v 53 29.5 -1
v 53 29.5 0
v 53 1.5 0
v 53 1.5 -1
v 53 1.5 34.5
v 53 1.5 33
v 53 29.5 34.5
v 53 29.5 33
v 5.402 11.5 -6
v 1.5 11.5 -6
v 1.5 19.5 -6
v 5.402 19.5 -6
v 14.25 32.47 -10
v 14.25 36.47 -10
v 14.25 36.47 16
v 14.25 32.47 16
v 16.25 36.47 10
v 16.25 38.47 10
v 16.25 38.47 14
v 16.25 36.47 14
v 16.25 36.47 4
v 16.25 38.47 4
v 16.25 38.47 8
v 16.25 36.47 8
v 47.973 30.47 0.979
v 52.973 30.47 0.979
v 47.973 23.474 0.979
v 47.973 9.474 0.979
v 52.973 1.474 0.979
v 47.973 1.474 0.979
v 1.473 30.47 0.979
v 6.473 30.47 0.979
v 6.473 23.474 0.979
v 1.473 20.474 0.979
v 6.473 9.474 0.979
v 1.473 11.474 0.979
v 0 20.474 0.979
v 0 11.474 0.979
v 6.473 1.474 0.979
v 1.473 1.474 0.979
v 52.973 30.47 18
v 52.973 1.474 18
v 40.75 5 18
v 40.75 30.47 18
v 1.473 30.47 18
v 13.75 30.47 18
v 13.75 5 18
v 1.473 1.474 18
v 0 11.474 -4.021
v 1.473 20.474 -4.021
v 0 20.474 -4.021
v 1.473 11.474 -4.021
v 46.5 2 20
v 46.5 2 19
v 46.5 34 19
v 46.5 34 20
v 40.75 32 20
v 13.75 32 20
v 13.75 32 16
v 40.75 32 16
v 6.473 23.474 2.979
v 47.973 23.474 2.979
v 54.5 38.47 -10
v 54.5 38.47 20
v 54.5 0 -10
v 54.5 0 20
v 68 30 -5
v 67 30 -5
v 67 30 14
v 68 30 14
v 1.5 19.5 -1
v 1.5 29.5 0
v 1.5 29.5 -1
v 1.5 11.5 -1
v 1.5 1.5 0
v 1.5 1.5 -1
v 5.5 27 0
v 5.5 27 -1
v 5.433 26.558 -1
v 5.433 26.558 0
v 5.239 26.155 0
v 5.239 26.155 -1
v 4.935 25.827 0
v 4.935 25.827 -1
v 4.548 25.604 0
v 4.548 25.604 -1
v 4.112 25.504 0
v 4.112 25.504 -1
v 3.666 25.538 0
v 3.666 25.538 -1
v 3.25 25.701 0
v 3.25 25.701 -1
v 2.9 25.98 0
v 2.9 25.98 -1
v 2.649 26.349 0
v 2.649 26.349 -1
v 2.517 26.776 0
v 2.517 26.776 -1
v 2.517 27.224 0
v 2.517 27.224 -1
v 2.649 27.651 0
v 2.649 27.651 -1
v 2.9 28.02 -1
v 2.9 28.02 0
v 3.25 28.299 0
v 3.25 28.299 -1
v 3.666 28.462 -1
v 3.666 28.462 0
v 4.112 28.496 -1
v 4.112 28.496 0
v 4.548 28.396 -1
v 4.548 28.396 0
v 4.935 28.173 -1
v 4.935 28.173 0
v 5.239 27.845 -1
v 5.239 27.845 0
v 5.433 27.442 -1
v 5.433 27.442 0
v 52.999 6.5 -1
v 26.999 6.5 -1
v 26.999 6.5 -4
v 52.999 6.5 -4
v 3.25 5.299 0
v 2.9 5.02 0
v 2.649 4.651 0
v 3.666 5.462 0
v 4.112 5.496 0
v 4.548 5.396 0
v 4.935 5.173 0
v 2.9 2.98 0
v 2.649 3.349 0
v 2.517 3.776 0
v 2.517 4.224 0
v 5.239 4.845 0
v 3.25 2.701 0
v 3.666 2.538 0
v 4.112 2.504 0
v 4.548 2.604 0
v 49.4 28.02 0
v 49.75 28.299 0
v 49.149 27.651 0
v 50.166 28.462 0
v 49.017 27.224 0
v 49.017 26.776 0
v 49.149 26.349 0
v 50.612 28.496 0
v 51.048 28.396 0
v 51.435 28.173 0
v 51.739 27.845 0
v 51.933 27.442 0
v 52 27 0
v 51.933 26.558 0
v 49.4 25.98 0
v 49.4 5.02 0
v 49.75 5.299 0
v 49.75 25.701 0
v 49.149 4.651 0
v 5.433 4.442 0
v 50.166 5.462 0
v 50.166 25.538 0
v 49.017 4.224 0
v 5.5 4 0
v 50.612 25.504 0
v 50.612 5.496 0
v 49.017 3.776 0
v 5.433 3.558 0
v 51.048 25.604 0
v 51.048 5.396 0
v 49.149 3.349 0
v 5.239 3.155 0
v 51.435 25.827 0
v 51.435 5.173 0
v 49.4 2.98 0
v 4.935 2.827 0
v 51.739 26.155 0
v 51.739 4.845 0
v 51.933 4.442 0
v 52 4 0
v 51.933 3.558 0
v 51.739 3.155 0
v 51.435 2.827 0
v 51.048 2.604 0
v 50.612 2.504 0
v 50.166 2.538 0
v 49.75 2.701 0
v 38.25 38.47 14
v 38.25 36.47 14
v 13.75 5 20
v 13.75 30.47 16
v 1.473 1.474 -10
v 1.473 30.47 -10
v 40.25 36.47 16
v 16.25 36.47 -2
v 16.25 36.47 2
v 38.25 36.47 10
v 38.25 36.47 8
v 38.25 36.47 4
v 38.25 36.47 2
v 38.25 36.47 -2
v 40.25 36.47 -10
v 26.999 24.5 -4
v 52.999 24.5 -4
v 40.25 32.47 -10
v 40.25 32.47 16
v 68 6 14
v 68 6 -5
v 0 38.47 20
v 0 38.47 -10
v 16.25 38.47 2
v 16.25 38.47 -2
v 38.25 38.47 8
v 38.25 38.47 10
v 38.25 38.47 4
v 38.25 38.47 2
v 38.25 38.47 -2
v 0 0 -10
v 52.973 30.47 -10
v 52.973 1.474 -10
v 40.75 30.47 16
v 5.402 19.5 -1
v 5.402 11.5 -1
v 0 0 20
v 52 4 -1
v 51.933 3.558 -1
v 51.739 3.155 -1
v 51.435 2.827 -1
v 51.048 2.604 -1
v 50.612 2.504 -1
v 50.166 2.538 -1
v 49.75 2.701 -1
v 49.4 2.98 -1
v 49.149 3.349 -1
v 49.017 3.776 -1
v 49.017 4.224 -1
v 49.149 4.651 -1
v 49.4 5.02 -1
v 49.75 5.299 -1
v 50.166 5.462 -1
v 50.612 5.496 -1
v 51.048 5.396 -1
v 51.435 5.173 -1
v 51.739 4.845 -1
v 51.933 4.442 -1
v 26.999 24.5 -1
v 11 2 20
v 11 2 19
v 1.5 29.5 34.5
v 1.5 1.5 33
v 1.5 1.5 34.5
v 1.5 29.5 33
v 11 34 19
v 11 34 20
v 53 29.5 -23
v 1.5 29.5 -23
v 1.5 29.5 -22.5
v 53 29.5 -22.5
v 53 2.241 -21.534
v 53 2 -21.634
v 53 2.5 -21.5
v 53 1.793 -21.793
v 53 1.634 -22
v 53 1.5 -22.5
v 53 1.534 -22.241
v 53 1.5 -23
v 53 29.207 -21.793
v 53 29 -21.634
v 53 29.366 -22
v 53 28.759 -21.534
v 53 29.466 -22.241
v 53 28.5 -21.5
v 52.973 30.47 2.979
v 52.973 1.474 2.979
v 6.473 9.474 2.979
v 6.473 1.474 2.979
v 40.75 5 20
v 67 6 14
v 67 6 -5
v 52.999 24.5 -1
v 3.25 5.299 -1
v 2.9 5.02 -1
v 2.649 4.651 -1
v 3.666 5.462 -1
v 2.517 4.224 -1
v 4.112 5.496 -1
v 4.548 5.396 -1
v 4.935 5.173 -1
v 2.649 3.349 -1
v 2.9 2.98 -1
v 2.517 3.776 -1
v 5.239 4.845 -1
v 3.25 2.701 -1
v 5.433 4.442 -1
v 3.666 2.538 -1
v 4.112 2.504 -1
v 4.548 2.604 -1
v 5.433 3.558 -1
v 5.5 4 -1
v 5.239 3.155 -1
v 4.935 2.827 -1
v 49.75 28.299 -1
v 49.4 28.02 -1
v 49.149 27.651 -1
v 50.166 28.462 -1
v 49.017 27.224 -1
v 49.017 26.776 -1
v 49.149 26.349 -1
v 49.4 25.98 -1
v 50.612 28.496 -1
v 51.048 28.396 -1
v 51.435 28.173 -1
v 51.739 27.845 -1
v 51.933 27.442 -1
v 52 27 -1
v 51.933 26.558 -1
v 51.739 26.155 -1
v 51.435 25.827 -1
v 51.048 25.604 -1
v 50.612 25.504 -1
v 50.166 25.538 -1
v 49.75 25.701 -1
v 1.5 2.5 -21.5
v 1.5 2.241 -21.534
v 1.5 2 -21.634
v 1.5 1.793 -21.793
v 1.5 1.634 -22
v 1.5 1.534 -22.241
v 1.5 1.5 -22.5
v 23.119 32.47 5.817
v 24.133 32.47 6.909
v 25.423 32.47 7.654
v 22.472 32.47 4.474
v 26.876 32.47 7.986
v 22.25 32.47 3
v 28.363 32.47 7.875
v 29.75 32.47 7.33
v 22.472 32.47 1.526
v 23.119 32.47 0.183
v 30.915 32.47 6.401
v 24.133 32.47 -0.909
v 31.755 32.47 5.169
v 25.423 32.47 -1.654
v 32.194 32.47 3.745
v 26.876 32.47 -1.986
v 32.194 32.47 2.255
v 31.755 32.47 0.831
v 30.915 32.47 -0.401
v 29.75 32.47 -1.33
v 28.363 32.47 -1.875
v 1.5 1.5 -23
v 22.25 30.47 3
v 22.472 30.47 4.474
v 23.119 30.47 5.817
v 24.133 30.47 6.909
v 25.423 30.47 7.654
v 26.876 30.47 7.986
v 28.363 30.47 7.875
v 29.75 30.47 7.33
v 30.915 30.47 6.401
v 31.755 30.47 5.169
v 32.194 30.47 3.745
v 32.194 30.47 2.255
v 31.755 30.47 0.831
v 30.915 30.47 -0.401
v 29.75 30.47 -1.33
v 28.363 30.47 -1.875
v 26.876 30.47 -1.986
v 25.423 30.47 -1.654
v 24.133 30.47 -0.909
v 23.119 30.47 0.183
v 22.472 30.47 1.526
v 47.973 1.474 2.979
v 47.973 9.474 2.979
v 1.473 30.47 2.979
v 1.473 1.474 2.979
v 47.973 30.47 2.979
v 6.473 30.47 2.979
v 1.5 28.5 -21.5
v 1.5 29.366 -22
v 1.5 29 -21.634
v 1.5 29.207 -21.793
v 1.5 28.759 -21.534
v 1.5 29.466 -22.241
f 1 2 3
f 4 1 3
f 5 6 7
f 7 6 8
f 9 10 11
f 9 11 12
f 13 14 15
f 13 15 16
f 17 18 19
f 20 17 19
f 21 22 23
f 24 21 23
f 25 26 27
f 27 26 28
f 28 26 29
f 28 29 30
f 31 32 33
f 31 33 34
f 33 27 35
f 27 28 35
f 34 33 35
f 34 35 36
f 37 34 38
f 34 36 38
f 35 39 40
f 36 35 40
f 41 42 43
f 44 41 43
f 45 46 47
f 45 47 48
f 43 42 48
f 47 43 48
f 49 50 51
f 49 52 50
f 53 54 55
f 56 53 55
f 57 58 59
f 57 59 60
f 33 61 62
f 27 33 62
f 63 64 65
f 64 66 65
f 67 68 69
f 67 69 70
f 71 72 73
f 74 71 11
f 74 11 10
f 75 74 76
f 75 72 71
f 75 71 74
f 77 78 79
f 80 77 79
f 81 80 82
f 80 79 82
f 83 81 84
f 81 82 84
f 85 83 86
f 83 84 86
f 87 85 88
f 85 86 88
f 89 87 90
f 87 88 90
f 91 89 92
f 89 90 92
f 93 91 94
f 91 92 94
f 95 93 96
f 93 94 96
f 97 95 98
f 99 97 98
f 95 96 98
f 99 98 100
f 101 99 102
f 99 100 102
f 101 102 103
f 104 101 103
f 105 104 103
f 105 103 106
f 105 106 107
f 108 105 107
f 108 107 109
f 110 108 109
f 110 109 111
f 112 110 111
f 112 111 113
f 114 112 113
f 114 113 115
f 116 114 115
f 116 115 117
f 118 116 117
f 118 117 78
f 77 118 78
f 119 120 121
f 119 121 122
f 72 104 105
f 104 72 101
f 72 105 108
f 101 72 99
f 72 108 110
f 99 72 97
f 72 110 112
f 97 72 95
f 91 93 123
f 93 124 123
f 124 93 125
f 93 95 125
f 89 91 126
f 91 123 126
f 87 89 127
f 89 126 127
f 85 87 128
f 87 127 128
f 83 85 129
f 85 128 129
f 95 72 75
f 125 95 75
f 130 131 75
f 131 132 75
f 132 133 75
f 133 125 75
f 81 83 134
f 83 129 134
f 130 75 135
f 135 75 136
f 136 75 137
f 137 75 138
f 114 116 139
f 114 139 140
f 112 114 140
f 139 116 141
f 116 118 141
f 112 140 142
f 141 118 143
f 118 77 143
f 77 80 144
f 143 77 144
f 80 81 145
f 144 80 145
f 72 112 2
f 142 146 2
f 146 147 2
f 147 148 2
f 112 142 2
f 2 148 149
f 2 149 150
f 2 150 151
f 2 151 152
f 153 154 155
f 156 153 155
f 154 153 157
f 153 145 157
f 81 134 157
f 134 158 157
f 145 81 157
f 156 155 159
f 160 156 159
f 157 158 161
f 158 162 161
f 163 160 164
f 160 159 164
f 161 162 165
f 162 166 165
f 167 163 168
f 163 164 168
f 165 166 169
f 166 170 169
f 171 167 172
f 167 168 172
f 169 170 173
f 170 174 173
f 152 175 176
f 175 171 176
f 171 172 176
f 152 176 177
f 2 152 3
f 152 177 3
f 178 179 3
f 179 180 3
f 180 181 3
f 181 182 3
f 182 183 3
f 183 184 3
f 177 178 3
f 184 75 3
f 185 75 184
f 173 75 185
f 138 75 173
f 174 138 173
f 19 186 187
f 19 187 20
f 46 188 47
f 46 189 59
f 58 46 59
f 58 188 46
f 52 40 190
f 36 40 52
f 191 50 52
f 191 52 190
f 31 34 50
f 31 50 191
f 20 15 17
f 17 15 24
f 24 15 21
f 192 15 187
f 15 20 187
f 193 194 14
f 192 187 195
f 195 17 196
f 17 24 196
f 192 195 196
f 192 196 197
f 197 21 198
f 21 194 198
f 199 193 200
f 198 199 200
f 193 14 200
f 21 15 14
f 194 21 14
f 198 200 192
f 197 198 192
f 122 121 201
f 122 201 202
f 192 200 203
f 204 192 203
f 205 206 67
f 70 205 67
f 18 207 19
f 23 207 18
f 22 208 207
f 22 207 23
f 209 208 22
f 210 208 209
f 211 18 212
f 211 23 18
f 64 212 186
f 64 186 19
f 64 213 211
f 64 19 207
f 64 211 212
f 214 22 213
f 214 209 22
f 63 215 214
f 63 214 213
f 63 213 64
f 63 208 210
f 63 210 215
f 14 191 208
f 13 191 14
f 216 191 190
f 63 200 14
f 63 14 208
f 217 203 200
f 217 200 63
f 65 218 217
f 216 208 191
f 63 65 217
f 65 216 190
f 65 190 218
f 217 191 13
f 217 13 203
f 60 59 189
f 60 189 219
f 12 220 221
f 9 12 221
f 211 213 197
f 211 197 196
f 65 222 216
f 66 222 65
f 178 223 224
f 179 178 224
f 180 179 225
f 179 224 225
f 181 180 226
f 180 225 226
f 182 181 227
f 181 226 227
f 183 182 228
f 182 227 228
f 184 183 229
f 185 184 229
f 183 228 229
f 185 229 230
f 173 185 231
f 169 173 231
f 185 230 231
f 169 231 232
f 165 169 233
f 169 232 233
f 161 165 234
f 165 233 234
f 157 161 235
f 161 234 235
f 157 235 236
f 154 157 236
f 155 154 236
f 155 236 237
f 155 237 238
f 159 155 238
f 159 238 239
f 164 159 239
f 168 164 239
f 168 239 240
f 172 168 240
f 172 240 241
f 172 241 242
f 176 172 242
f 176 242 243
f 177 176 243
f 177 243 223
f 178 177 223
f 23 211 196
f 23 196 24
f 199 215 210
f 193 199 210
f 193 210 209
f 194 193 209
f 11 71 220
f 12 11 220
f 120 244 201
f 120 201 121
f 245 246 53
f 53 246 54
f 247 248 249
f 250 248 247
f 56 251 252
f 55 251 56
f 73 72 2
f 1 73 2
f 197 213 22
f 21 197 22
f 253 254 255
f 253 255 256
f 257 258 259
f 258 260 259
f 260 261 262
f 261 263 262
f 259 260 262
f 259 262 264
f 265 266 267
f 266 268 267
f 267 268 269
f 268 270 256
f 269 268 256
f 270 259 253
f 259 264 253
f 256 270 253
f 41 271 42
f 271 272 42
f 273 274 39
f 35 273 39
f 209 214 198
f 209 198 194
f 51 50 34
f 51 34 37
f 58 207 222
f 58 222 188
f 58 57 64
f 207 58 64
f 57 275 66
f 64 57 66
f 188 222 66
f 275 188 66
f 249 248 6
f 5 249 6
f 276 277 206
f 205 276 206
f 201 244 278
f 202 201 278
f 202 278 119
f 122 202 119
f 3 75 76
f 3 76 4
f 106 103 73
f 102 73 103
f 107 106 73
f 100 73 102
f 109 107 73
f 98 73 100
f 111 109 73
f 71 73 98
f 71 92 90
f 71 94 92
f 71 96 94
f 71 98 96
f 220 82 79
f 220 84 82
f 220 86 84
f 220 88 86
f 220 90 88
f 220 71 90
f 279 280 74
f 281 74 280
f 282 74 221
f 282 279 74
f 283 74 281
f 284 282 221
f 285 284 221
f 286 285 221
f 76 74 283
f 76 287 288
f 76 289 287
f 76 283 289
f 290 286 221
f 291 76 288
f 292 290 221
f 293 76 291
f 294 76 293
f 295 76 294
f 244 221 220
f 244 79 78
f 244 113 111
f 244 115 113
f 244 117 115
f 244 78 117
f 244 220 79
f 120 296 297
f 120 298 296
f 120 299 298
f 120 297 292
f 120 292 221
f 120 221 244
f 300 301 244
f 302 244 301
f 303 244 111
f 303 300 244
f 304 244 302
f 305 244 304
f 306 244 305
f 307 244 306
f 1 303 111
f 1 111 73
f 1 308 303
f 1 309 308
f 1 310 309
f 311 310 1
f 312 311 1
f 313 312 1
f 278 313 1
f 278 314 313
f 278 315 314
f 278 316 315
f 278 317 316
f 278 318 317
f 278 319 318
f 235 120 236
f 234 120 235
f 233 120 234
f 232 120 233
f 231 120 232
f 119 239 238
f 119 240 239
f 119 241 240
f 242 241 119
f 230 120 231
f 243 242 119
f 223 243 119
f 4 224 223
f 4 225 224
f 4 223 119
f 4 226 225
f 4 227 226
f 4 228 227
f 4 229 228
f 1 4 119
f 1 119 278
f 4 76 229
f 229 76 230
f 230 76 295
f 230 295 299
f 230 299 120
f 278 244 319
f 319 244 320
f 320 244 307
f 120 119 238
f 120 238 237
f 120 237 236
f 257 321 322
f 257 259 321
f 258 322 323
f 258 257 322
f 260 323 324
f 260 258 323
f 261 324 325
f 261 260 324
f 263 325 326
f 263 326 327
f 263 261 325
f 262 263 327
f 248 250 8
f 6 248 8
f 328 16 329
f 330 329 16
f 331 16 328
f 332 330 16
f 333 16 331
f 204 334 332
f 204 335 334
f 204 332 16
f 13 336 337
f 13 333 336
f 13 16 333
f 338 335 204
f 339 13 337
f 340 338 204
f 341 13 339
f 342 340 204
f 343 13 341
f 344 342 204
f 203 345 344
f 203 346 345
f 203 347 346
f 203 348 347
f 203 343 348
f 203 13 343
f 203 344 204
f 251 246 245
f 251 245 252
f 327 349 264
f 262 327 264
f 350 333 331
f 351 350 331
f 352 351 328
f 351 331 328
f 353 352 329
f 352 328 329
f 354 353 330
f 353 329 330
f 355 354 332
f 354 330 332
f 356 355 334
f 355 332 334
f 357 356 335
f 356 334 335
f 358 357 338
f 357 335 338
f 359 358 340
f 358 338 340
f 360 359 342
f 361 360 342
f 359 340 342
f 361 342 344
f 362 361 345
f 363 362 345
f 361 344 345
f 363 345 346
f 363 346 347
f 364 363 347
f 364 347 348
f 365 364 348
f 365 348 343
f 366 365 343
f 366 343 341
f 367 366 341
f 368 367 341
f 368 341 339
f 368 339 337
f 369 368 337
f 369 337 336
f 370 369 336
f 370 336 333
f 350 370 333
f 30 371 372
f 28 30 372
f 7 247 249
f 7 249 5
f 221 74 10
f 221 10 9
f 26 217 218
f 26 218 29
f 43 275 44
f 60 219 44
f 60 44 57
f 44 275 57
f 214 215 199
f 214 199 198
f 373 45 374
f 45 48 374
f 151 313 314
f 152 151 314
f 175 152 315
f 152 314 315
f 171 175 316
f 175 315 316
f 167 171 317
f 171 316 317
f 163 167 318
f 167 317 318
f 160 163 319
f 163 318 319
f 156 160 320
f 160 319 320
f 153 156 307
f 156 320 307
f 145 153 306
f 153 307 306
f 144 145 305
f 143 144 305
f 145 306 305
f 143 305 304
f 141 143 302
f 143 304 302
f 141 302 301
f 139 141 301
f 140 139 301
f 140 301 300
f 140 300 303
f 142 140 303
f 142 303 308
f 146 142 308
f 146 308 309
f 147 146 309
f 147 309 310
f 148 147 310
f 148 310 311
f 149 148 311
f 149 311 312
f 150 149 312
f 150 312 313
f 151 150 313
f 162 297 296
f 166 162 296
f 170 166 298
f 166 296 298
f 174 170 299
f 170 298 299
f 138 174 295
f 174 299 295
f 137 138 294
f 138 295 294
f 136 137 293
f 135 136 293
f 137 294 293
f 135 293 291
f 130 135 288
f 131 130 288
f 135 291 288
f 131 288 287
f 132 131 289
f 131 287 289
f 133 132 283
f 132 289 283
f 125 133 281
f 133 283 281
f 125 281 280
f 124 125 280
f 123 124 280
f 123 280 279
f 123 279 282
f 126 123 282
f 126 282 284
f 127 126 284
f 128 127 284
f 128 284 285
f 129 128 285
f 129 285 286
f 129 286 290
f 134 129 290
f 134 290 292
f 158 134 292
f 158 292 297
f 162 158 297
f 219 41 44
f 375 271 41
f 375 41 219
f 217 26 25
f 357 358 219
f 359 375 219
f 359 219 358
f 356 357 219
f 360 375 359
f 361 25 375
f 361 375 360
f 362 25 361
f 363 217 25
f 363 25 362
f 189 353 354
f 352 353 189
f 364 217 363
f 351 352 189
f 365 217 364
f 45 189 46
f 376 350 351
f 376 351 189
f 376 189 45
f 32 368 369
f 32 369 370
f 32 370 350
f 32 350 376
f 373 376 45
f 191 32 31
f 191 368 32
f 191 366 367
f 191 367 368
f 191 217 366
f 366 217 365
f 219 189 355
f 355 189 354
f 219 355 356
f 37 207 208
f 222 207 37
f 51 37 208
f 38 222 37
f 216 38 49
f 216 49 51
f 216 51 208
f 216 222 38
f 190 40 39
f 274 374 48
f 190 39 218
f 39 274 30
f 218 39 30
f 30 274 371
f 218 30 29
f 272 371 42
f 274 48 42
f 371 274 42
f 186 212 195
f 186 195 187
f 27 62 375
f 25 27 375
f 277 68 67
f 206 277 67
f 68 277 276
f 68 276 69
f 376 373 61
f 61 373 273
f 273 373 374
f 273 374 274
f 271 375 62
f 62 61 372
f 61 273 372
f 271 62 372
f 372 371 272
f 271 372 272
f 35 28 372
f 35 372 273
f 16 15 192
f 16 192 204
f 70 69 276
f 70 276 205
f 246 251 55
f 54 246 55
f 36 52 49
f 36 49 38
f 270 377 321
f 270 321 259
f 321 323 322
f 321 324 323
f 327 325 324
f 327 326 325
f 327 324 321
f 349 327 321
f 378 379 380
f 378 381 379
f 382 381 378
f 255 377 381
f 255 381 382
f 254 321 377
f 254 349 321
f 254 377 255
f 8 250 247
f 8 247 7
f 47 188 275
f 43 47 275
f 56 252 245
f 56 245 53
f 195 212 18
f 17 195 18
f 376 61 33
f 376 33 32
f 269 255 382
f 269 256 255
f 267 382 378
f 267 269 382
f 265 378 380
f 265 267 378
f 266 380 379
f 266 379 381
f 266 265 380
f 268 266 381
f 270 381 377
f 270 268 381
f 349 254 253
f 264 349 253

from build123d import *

# Parameters (mm, degrees)
SKETCH_W             = 51.5
SKETCH_H             = 28
PAD_DEPTH            = 1
SKETCH001_R          = 1.5
POCKET_DEPTH         = 5
SKETCH002_W          = 26
SKETCH002_H          = 18
PAD001_DEPTH         = 3
SKETCH006_W          = 3.902349
SKETCH006_H          = 8
PAD004_DEPTH         = 5
BODY_PLACEMENT_ANGLE = 180
SKETCH003_W          = 54.5
SKETCH003_H          = 31
SKETCH003_W_2        = 51.5
SKETCH003_H_2        = 28
PAD002_DEPTH         = 20
PAD002_DEPTH_BACK    = 10
SKETCH004_W          = 28
SKETCH004_H          = 2
PAD003_DEPTH         = 53.026759
SKETCH005_W          = 41.5
SKETCH005_H          = 6
POCKET001_DEPTH      = 5
SKETCH009_W          = 5
SKETCH009_H          = 8
POCKET002_DEPTH      = 5
POCKET002_FACE6_W    = 54.5
POCKET002_FACE6_H    = 30
PAD005_DEPTH         = 6
SKETCH010_W          = 35.630659
SKETCH010_H          = 4.577942
POCKET003_DEPTH      = 5
POCKET003_FACE17_W   = 35.630659
POCKET003_FACE17_H   = 5
POCKET004_DEPTH      = 5
SKETCH011_W          = 26.5
SKETCH011_H          = 5.025935
POCKET005_DEPTH      = 24
SKETCH012_R          = 5
POCKET006_DEPTH      = 5
SKETCH013_W          = 4
SKETCH013_H          = 16
POCKET007_DEPTH      = 5
SKETCH015_W          = 9.49
SKETCH015_H          = 2
SKETCH015_W_2        = 6.383382
PAD006_DEPTH         = 28
SKETCH016_W          = 7.53
SKETCH016_H          = 30
PAD007_DEPTH         = 54.5
PAD007_FACE3_W       = 27.995935
PAD007_FACE3_H       = 2
PAD008_DEPTH         = 43.536759
POCKET008_DEPTH      = 1
POCKET008_FACE9_W    = 1.473241
POCKET008_FACE9_H    = 5
POCKET009_DEPTH      = 1
SKETCH017_W          = 27
SKETCH017_H          = 27
POCKET010_DEPTH      = 4
POCKET010_FACE6_W    = 54.5
POCKET010_FACE6_H    = 30
PAD009_DEPTH         = 0.47
PAD009_FACE3_W       = 54.5
PAD009_FACE3_H       = 30
PAD010_DEPTH         = 0.47
PAD010_FACE3_W       = 54.5
PAD010_FACE3_H       = 30
POCKET011_DEPTH      = 0.47
POCKET011_FACE6_W    = 54.5
POCKET011_FACE6_H    = 30
PAD011_DEPTH         = 1
SKETCH018_W          = 26
SKETCH018_H          = 4
POCKET012_DEPTH      = 21
POCKET012_FACE34_W   = 4
POCKET012_FACE34_H   = 26
POCKET013_DEPTH      = 5
SKETCH019_W          = 22
SKETCH019_H          = 4
POCKET014_DEPTH      = 5
SKETCH020_R          = 5
POCKET015_DEPTH      = 5
POCKET015_FACE39_W   = 41.5
POCKET015_FACE39_H   = 2
POCKET016_DEPTH      = 2
BOX001_W             = 51.5
BOX001_H             = 28
BOX001_DEPTH         = 1.5
BOX002_W             = 35.5
BOX002_H             = 32
BOX002_DEPTH         = 1
BOX_W                = 51.5
BOX_H                = 28
BOX_DEPTH            = 1.5
FILLET_R             = 1
FILLET001_R          = 1
BOX003_W             = 1
BOX003_H             = 24
BOX003_DEPTH         = 19


with BuildPart() as esp32:
    # Sketch → Pad (new body)
    with BuildSketch(Plane.XY):
        with Locations((25.75, 14)):
            Rectangle(SKETCH_W, SKETCH_H)
    extrude(amount=PAD_DEPTH)

    # Sketch001 (on Face6 of Pad) → Pocket (cut)
    with BuildSketch(Plane.XY.offset(1)):
        with Locations((2.5, 2.5)):
            Circle(SKETCH001_R)
        with Locations((2.5, 25.5)):
            Circle(SKETCH001_R)
        with Locations((49, 25.5)):
            Circle(SKETCH001_R)
        with Locations((49, 2.5)):
            Circle(SKETCH001_R)
    extrude(amount=-POCKET_DEPTH, mode=Mode.SUBTRACT)

    # Sketch002 (on Face5 of Pocket) → Pad001 (join)
    with BuildSketch(Plane.XY.offset(1)):
        with Locations((38.499119, 14)):
            Rectangle(SKETCH002_W, SKETCH002_H)
    extrude(amount=PAD001_DEPTH)

    # Sketch006 (on Face5 of Pad001) → Pad004 (join)
    with BuildSketch(Plane.XY.offset(1)):
        with Locations((1.9511745, 14)):
            Rectangle(SKETCH006_W, SKETCH006_H)
    extrude(amount=PAD004_DEPTH)


with BuildPart() as esp32_1:
    # Body placement: moved
    add(esp32.part.moved(Location((1.5, 29.5, 0))).rotate(Axis((1.5, 29.5, 0), (1, 0, 0)), BODY_PLACEMENT_ANGLE))


with BuildPart() as body001:
    # Sketch003 → Pad002 (new body, two sides)
    with BuildSketch(Plane.XY) as pad002_sk:
        with Locations((27.25, 15.5)):
            Rectangle(SKETCH003_W, SKETCH003_H)
        with Locations((27.223241, 15.474065)):
            Rectangle(SKETCH003_W_2, SKETCH003_H_2, mode=Mode.SUBTRACT)
    extrude(amount=PAD002_DEPTH)
    extrude(pad002_sk.sketch, amount=-PAD002_DEPTH_BACK)

    # Sketch004 (on Face5 of Pad002) → Pad003 (join)
    with BuildSketch(Plane.YZ.offset(1.473241)):
        with Locations((15.474065, 1.979288)):
            Rectangle(SKETCH004_W, SKETCH004_H)
    extrude(amount=PAD003_DEPTH)

    # Sketch005 (on Face15 of Pad003) → Pocket001 (cut)
    with BuildSketch(Plane.XY.offset(2.979288)):
        with Locations((27.223241, 26.474065)):
            Rectangle(SKETCH005_W, SKETCH005_H)
        with Locations((27.223241, 4.474065)):
            Rectangle(SKETCH005_W, SKETCH005_H)
    extrude(amount=-POCKET001_DEPTH, mode=Mode.SUBTRACT)

    # Sketch009 (on Face7 of Pocket001) → Pocket002 (cut)
    with BuildSketch(Plane(origin=(1.473241, 15.474065, -4.510356), x_dir=(0, 0, 1), z_dir=(1, 0, 0))):
        with Locations((2.989644, 0)):
            Rectangle(SKETCH009_W, SKETCH009_H)
    extrude(amount=-POCKET002_DEPTH, mode=Mode.SUBTRACT)

    # Pocket002 Face6 → Pad005 (add)
    with BuildSketch(Plane(origin=(27.25, 31, 5), x_dir=(1, 0, 0), z_dir=(0, 1, 0))):
        Rectangle(POCKET002_FACE6_W, POCKET002_FACE6_H)
    extrude(amount=PAD005_DEPTH)

    # Sketch010 (on Face23 of Pad005) → Pocket003 (cut)
    with BuildSketch(Plane.XY.offset(20)):
        with Locations((28.7745295, 31.796246)):
            Rectangle(SKETCH010_W, SKETCH010_H)
    extrude(amount=-POCKET003_DEPTH, mode=Mode.SUBTRACT)

    # Pocket003 Face17 → Pocket004 (cut)
    with BuildSketch(Plane(origin=(28.7745295, 29.507275, 17.5), x_dir=(1, 0, 0), z_dir=(0, 1, 0))):
        Rectangle(POCKET003_FACE17_W, POCKET003_FACE17_H)
    extrude(amount=-POCKET004_DEPTH, mode=Mode.SUBTRACT)

    # Sketch011 (on Face4 of Pocket004) → Pocket005 (cut)
    with BuildSketch(Plane(origin=(0, 0, -10), x_dir=(1, 0, 0), z_dir=(0, 0, -1))):
        with Locations((27.25, -33.2370325)):
            Rectangle(SKETCH011_W, SKETCH011_H)
    extrude(amount=-POCKET005_DEPTH, mode=Mode.SUBTRACT)

    # Sketch012 (on Face18 of Pocket005) → Pocket006 (cut)
    with BuildSketch(Plane(origin=(0, 30.724065, 0), x_dir=(-1, 0, 0), z_dir=(0, 1, 0))):
        with Locations((-24, 2)):
            Circle(SKETCH012_R)
    extrude(amount=-POCKET006_DEPTH, mode=Mode.SUBTRACT)

    # Sketch013 (on Face6 of Pocket006) → Pocket007 (cut)
    with BuildSketch(Plane(origin=(0, 37, 0), x_dir=(-1, 0, 0), z_dir=(0, 1, 0))):
        with Locations((-36, 5)):
            Rectangle(SKETCH013_W, SKETCH013_H)
        with Locations((-30, 5)):
            Rectangle(SKETCH013_W, SKETCH013_H)
        with Locations((-24, 5)):
            Rectangle(SKETCH013_W, SKETCH013_H)
        with Locations((-18, 5)):
            Rectangle(SKETCH013_W, SKETCH013_H)
    extrude(amount=-POCKET007_DEPTH, mode=Mode.SUBTRACT)

    # Sketch015 (on Face12 of Pocket007) → Pad006 (join)
    with BuildSketch(Plane.XZ.offset(-29.474065)):
        with Locations((6.218241, 19)):
            Rectangle(SKETCH015_W, SKETCH015_H)
        with Locations((49.78155, 19)):
            Rectangle(SKETCH015_W_2, SKETCH015_H)
    extrude(amount=PAD006_DEPTH)

    # Sketch016 (on Face4 of Pad006) → Pad007 (join)
    with BuildSketch(Plane(origin=(0, 0, 0), x_dir=(0, -1, 0), z_dir=(-1, 0, 0))):
        with Locations((-33.235, 5)):
            Rectangle(SKETCH016_W, SKETCH016_H)
    extrude(amount=-PAD007_DEPTH)

    # Pad007 Face3 → Pad008 (add)
    with BuildSketch(Plane(origin=(10.963241, 15.4720325, 19), x_dir=(0, -1, 0), z_dir=(1, 0, 0))):
        Rectangle(PAD007_FACE3_W, PAD007_FACE3_H)
    extrude(amount=PAD008_DEPTH)

    # Pad008 Face10 → Pocket008 (cut)
    with BuildSketch(Plane(origin=(27.223241, 29.47, 4.0284207032), x_dir=(-1, 0, 0), z_dir=(0, -1, 0))):
        Polygon((20.75, 3.0491327032), (25.75, 3.0491327032), (25.75, 14.0284207032), (-25.75, 14.0284207032), (-25.75, 3.0491327032), (-20.75, 3.0491327032), (-20.75, 1.0491327032), (-25.75, 1.0491327032), (-25.75, -13.9715792968), (25.75, -13.9715792968), (25.75, 1.0491327032), (20.75, 1.0491327032), align=None)
    extrude(amount=-POCKET008_DEPTH, mode=Mode.SUBTRACT)

    # Pocket008 Face9 → Pocket009 (cut)
    with BuildSketch(Plane(origin=(0.7366205, 19.474065, -1.520712), x_dir=(-1, 0, 0), z_dir=(0, -1, 0))):
        Rectangle(POCKET008_FACE9_W, POCKET008_FACE9_H)
    extrude(amount=-POCKET009_DEPTH, mode=Mode.SUBTRACT)

    # Sketch017 (on Face23 of Pad008) → Pocket010 (cut)
    with BuildSketch(Plane.XY.offset(20)):
        with Locations((27.25, 18.5)):
            Rectangle(SKETCH017_W, SKETCH017_H)
    extrude(amount=-POCKET010_DEPTH, mode=Mode.SUBTRACT)

    # Pocket010 Face6 → Pad009 (add)
    with BuildSketch(Plane(origin=(27.25, 37, 5), x_dir=(1, 0, 0), z_dir=(0, 1, 0))):
        Rectangle(POCKET010_FACE6_W, POCKET010_FACE6_H)
    extrude(amount=PAD009_DEPTH)

    # Pad009 Face3 → Pad010 (add)
    with BuildSketch(Plane(origin=(27.25, 37.47, 5), x_dir=(1, 0, 0), z_dir=(0, 1, 0))):
        Rectangle(PAD009_FACE3_W, PAD009_FACE3_H)
    extrude(amount=PAD010_DEPTH)

    # Pad010 Face3 → Pocket011 (cut)
    with BuildSketch(Plane(origin=(27.25, 37.94, 5), x_dir=(1, 0, 0), z_dir=(0, 1, 0))):
        Rectangle(PAD010_FACE3_W, PAD010_FACE3_H)
    extrude(amount=-POCKET011_DEPTH, mode=Mode.SUBTRACT)

    # Pocket011 Face6 → Pad011 (add)
    with BuildSketch(Plane(origin=(27.25, 37.47, 5), x_dir=(1, 0, 0), z_dir=(0, 1, 0))):
        Rectangle(POCKET011_FACE6_W, POCKET011_FACE6_H)
    extrude(amount=PAD011_DEPTH)

    # Sketch018 (on Face28 of Pad011) → Pocket012 (cut)
    with BuildSketch(Plane(origin=(0, 0, -10), x_dir=(1, 0, 0), z_dir=(0, 0, -1))):
        with Locations((27.25, -34.47)):
            Rectangle(SKETCH018_W, SKETCH018_H)
    extrude(amount=-POCKET012_DEPTH, mode=Mode.SUBTRACT)

    # Pocket012 Face34 → Pocket013 (cut)
    with BuildSketch(Plane(origin=(27.25, 34.47, 11), x_dir=(0, -1, 0), z_dir=(0, 0, -1))):
        Rectangle(POCKET012_FACE34_W, POCKET012_FACE34_H)
    extrude(amount=-POCKET013_DEPTH, mode=Mode.SUBTRACT)

    # Sketch019 (on Face6 of Pocket013) → Pocket014 (cut)
    with BuildSketch(Plane(origin=(0, 38.47, 0), x_dir=(-1, 0, 0), z_dir=(0, 1, 0))):
        with Locations((-27.25, 12)):
            Rectangle(SKETCH019_W, SKETCH019_H)
        with Locations((-27.25, 6)):
            Rectangle(SKETCH019_W, SKETCH019_H)
        with Locations((-27.25, 0)):
            Rectangle(SKETCH019_W, SKETCH019_H)
    extrude(amount=-POCKET014_DEPTH, mode=Mode.SUBTRACT)

    # Sketch020 (on Face18 of Pocket014) → Pocket015 (cut)
    with BuildSketch(Plane(origin=(0, 32.47, 0), x_dir=(-1, 0, 0), z_dir=(0, 1, 0))):
        with Locations((-27.25, 3)):
            Circle(SKETCH020_R)
    extrude(amount=-POCKET015_DEPTH, mode=Mode.SUBTRACT)

    # Pocket015 Face39 → Pocket016 (cut)
    with BuildSketch(Plane(origin=(27.223241, 7.474065, 1.979288), x_dir=(-1, 0, 0), z_dir=(0, -1, 0))):
        Rectangle(POCKET015_FACE39_W, POCKET015_FACE39_H)
    extrude(amount=-POCKET016_DEPTH, mode=Mode.SUBTRACT)


with BuildPart() as box001:
    # Box001 → Box001 (new body)
    with BuildSketch(Plane(origin=(1.5, 1.5, 33), x_dir=(1, 0, 0), z_dir=(0, 0, 1))):
        with Locations((25.75, 14)):
            Rectangle(BOX001_W, BOX001_H)
    extrude(amount=BOX001_DEPTH)


with BuildPart() as box002:
    # Box002 → Box002 (new body)
    with BuildSketch(Plane(origin=(11, 2, 19), x_dir=(1, 0, 0), z_dir=(0, 0, 1))):
        with Locations((17.75, 16)):
            Rectangle(BOX002_W, BOX002_H)
    extrude(amount=BOX002_DEPTH)


with BuildPart() as fillet001:
    # Box → Box (new body)
    with BuildSketch(Plane(origin=(1.5, 1.5, -23), x_dir=(1, 0, 0), z_dir=(0, 0, 1))):
        with Locations((25.75, 14)):
            Rectangle(BOX_W, BOX_H)
    extrude(amount=BOX_DEPTH)

    # Fillet
    fillet_edges = [fillet001.edges().sort_by_distance(p)[0] for p in [
        (27.25, 29.5, -21.5),
    ]]
    fillet(fillet_edges, radius=FILLET_R)

    # Fillet001
    fillet001_edges = [fillet001.edges().sort_by_distance(p)[0] for p in [
        (27.25, 1.5, -21.5),
    ]]
    fillet(fillet001_edges, radius=FILLET001_R)


with BuildPart() as sensor:
    # Box003 → Box003 (new body)
    with BuildSketch(Plane(origin=(67, 6, -5), x_dir=(1, 0, 0), z_dir=(0, 0, 1))):
        with Locations((0.5, 12)):
            Rectangle(BOX003_W, BOX003_H)
    extrude(amount=BOX003_DEPTH)


solid = Compound([esp32_1.part, body001.part, box001.part, box002.part, fillet001.part, sensor.part])
